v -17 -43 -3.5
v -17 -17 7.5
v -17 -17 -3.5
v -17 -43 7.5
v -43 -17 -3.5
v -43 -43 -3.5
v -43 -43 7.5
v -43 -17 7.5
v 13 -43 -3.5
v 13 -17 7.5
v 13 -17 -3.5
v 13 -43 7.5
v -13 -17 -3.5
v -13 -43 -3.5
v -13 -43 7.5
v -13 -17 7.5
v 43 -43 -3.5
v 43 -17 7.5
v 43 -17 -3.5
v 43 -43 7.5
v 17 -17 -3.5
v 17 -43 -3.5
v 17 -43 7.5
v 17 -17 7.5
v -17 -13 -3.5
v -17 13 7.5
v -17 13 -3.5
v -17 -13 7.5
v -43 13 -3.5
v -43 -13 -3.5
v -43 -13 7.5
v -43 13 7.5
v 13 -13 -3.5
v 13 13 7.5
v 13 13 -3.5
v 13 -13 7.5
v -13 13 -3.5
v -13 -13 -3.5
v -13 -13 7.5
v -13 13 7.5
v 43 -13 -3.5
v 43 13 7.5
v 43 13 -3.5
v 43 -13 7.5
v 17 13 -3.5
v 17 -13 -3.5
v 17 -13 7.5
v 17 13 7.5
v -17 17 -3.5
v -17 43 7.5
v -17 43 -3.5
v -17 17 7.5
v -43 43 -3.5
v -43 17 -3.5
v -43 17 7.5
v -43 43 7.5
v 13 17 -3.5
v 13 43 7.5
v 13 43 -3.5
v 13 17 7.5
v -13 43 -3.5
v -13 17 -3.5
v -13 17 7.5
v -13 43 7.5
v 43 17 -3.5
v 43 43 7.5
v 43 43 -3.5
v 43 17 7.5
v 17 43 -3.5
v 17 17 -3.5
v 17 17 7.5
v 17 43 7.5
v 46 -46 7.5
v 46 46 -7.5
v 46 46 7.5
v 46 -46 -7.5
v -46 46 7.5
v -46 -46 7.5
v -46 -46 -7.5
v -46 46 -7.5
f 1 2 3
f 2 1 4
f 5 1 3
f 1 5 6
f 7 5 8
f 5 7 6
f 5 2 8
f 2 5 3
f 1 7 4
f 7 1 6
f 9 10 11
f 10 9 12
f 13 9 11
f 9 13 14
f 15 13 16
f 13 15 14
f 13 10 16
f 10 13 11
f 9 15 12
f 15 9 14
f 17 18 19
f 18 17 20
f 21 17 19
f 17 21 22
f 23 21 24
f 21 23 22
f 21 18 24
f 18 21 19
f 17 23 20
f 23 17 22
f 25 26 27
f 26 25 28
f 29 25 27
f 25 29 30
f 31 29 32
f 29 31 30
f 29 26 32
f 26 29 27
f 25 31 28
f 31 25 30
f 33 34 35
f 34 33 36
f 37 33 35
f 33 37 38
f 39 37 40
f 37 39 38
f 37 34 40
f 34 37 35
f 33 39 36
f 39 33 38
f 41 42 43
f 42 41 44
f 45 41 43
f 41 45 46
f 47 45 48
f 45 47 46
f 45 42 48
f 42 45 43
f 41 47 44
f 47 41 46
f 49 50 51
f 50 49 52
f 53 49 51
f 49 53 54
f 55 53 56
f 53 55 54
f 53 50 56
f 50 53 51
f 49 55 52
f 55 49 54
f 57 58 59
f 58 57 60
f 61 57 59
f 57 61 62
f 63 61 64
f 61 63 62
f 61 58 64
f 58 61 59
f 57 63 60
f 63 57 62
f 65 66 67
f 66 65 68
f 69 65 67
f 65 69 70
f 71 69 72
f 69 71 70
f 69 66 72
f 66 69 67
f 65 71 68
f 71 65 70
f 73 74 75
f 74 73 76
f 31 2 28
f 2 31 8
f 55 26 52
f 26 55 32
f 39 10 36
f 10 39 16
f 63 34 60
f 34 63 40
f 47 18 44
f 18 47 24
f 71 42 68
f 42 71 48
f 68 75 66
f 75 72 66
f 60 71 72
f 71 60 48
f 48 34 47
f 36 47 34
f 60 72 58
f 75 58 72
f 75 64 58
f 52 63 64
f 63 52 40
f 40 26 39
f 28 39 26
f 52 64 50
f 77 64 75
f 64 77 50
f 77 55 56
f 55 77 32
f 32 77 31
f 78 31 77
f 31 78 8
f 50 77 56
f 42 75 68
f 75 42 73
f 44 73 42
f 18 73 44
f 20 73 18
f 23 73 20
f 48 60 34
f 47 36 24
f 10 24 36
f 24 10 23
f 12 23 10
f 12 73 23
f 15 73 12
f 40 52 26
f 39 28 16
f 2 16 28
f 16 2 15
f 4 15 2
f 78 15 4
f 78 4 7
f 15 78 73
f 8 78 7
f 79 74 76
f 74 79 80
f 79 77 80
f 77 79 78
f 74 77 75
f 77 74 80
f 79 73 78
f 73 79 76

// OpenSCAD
$fn = 32;

// ----------------------------------------------------------------------
// Pocket plate 92 x 92 x 15
// 3 x 3 pockets 26 mm square, 11 mm deep
// ----------------------------------------------------------------------

// --- parameters (mm) ---
thickness = 15;  // plate thickness
floor_t = 4;     // material left under each pocket
pocket = 26;     // pocket side length
pitch_x = 30;    // pocket pitch along X
pitch_y = 30;    // pocket pitch along Y
cols = 3;        // pockets per row
rows = 3;        // rows of pockets

// --- derived feature positions (mm) ---
depth = thickness - floor_t;        // = 11   pocket depth, down to the floor
span_x = (cols - 1) * pitch_x;      // = 60   distance between outer pockets
span_y = (rows - 1) * pitch_y;      // = 60   distance between outer pocket rows
origin_x = -span_x / 2;             // = -30   X of the first pocket
origin_y = -span_y / 2;             // = -30   Y of the first pocket
plate = [span_x + pocket + 6, span_y + pocket + 6, thickness];  // = [92, 92, 15]   overall size: pockets plus 3 mm of wall on each side
feature_centers = [
  [origin_x + 0 * pitch_x, origin_y + 0 * pitch_y],
  [origin_x + 1 * pitch_x, origin_y + 0 * pitch_y],
  [origin_x + 2 * pitch_x, origin_y + 0 * pitch_y],
  [origin_x + 0 * pitch_x, origin_y + 1 * pitch_y],
  [origin_x + 1 * pitch_x, origin_y + 1 * pitch_y],
  [origin_x + 2 * pitch_x, origin_y + 1 * pitch_y],
  [origin_x + 0 * pitch_x, origin_y + 2 * pitch_y],
  [origin_x + 1 * pitch_x, origin_y + 2 * pitch_y],
  [origin_x + 2 * pitch_x, origin_y + 2 * pitch_y]
];   // pocket centres, used verbatim by the cutter loop

// plate outline, then one pocket per centre in feature_centers
difference() {
  cube(plate, center = true);
  for (centre = feature_centers)
    translate([centre[0] - pocket / 2, centre[1] - pocket / 2, plate[2] / 2 - depth])
      cube([pocket, pocket, depth + 1]);  // centred on the declared pocket centre
}
